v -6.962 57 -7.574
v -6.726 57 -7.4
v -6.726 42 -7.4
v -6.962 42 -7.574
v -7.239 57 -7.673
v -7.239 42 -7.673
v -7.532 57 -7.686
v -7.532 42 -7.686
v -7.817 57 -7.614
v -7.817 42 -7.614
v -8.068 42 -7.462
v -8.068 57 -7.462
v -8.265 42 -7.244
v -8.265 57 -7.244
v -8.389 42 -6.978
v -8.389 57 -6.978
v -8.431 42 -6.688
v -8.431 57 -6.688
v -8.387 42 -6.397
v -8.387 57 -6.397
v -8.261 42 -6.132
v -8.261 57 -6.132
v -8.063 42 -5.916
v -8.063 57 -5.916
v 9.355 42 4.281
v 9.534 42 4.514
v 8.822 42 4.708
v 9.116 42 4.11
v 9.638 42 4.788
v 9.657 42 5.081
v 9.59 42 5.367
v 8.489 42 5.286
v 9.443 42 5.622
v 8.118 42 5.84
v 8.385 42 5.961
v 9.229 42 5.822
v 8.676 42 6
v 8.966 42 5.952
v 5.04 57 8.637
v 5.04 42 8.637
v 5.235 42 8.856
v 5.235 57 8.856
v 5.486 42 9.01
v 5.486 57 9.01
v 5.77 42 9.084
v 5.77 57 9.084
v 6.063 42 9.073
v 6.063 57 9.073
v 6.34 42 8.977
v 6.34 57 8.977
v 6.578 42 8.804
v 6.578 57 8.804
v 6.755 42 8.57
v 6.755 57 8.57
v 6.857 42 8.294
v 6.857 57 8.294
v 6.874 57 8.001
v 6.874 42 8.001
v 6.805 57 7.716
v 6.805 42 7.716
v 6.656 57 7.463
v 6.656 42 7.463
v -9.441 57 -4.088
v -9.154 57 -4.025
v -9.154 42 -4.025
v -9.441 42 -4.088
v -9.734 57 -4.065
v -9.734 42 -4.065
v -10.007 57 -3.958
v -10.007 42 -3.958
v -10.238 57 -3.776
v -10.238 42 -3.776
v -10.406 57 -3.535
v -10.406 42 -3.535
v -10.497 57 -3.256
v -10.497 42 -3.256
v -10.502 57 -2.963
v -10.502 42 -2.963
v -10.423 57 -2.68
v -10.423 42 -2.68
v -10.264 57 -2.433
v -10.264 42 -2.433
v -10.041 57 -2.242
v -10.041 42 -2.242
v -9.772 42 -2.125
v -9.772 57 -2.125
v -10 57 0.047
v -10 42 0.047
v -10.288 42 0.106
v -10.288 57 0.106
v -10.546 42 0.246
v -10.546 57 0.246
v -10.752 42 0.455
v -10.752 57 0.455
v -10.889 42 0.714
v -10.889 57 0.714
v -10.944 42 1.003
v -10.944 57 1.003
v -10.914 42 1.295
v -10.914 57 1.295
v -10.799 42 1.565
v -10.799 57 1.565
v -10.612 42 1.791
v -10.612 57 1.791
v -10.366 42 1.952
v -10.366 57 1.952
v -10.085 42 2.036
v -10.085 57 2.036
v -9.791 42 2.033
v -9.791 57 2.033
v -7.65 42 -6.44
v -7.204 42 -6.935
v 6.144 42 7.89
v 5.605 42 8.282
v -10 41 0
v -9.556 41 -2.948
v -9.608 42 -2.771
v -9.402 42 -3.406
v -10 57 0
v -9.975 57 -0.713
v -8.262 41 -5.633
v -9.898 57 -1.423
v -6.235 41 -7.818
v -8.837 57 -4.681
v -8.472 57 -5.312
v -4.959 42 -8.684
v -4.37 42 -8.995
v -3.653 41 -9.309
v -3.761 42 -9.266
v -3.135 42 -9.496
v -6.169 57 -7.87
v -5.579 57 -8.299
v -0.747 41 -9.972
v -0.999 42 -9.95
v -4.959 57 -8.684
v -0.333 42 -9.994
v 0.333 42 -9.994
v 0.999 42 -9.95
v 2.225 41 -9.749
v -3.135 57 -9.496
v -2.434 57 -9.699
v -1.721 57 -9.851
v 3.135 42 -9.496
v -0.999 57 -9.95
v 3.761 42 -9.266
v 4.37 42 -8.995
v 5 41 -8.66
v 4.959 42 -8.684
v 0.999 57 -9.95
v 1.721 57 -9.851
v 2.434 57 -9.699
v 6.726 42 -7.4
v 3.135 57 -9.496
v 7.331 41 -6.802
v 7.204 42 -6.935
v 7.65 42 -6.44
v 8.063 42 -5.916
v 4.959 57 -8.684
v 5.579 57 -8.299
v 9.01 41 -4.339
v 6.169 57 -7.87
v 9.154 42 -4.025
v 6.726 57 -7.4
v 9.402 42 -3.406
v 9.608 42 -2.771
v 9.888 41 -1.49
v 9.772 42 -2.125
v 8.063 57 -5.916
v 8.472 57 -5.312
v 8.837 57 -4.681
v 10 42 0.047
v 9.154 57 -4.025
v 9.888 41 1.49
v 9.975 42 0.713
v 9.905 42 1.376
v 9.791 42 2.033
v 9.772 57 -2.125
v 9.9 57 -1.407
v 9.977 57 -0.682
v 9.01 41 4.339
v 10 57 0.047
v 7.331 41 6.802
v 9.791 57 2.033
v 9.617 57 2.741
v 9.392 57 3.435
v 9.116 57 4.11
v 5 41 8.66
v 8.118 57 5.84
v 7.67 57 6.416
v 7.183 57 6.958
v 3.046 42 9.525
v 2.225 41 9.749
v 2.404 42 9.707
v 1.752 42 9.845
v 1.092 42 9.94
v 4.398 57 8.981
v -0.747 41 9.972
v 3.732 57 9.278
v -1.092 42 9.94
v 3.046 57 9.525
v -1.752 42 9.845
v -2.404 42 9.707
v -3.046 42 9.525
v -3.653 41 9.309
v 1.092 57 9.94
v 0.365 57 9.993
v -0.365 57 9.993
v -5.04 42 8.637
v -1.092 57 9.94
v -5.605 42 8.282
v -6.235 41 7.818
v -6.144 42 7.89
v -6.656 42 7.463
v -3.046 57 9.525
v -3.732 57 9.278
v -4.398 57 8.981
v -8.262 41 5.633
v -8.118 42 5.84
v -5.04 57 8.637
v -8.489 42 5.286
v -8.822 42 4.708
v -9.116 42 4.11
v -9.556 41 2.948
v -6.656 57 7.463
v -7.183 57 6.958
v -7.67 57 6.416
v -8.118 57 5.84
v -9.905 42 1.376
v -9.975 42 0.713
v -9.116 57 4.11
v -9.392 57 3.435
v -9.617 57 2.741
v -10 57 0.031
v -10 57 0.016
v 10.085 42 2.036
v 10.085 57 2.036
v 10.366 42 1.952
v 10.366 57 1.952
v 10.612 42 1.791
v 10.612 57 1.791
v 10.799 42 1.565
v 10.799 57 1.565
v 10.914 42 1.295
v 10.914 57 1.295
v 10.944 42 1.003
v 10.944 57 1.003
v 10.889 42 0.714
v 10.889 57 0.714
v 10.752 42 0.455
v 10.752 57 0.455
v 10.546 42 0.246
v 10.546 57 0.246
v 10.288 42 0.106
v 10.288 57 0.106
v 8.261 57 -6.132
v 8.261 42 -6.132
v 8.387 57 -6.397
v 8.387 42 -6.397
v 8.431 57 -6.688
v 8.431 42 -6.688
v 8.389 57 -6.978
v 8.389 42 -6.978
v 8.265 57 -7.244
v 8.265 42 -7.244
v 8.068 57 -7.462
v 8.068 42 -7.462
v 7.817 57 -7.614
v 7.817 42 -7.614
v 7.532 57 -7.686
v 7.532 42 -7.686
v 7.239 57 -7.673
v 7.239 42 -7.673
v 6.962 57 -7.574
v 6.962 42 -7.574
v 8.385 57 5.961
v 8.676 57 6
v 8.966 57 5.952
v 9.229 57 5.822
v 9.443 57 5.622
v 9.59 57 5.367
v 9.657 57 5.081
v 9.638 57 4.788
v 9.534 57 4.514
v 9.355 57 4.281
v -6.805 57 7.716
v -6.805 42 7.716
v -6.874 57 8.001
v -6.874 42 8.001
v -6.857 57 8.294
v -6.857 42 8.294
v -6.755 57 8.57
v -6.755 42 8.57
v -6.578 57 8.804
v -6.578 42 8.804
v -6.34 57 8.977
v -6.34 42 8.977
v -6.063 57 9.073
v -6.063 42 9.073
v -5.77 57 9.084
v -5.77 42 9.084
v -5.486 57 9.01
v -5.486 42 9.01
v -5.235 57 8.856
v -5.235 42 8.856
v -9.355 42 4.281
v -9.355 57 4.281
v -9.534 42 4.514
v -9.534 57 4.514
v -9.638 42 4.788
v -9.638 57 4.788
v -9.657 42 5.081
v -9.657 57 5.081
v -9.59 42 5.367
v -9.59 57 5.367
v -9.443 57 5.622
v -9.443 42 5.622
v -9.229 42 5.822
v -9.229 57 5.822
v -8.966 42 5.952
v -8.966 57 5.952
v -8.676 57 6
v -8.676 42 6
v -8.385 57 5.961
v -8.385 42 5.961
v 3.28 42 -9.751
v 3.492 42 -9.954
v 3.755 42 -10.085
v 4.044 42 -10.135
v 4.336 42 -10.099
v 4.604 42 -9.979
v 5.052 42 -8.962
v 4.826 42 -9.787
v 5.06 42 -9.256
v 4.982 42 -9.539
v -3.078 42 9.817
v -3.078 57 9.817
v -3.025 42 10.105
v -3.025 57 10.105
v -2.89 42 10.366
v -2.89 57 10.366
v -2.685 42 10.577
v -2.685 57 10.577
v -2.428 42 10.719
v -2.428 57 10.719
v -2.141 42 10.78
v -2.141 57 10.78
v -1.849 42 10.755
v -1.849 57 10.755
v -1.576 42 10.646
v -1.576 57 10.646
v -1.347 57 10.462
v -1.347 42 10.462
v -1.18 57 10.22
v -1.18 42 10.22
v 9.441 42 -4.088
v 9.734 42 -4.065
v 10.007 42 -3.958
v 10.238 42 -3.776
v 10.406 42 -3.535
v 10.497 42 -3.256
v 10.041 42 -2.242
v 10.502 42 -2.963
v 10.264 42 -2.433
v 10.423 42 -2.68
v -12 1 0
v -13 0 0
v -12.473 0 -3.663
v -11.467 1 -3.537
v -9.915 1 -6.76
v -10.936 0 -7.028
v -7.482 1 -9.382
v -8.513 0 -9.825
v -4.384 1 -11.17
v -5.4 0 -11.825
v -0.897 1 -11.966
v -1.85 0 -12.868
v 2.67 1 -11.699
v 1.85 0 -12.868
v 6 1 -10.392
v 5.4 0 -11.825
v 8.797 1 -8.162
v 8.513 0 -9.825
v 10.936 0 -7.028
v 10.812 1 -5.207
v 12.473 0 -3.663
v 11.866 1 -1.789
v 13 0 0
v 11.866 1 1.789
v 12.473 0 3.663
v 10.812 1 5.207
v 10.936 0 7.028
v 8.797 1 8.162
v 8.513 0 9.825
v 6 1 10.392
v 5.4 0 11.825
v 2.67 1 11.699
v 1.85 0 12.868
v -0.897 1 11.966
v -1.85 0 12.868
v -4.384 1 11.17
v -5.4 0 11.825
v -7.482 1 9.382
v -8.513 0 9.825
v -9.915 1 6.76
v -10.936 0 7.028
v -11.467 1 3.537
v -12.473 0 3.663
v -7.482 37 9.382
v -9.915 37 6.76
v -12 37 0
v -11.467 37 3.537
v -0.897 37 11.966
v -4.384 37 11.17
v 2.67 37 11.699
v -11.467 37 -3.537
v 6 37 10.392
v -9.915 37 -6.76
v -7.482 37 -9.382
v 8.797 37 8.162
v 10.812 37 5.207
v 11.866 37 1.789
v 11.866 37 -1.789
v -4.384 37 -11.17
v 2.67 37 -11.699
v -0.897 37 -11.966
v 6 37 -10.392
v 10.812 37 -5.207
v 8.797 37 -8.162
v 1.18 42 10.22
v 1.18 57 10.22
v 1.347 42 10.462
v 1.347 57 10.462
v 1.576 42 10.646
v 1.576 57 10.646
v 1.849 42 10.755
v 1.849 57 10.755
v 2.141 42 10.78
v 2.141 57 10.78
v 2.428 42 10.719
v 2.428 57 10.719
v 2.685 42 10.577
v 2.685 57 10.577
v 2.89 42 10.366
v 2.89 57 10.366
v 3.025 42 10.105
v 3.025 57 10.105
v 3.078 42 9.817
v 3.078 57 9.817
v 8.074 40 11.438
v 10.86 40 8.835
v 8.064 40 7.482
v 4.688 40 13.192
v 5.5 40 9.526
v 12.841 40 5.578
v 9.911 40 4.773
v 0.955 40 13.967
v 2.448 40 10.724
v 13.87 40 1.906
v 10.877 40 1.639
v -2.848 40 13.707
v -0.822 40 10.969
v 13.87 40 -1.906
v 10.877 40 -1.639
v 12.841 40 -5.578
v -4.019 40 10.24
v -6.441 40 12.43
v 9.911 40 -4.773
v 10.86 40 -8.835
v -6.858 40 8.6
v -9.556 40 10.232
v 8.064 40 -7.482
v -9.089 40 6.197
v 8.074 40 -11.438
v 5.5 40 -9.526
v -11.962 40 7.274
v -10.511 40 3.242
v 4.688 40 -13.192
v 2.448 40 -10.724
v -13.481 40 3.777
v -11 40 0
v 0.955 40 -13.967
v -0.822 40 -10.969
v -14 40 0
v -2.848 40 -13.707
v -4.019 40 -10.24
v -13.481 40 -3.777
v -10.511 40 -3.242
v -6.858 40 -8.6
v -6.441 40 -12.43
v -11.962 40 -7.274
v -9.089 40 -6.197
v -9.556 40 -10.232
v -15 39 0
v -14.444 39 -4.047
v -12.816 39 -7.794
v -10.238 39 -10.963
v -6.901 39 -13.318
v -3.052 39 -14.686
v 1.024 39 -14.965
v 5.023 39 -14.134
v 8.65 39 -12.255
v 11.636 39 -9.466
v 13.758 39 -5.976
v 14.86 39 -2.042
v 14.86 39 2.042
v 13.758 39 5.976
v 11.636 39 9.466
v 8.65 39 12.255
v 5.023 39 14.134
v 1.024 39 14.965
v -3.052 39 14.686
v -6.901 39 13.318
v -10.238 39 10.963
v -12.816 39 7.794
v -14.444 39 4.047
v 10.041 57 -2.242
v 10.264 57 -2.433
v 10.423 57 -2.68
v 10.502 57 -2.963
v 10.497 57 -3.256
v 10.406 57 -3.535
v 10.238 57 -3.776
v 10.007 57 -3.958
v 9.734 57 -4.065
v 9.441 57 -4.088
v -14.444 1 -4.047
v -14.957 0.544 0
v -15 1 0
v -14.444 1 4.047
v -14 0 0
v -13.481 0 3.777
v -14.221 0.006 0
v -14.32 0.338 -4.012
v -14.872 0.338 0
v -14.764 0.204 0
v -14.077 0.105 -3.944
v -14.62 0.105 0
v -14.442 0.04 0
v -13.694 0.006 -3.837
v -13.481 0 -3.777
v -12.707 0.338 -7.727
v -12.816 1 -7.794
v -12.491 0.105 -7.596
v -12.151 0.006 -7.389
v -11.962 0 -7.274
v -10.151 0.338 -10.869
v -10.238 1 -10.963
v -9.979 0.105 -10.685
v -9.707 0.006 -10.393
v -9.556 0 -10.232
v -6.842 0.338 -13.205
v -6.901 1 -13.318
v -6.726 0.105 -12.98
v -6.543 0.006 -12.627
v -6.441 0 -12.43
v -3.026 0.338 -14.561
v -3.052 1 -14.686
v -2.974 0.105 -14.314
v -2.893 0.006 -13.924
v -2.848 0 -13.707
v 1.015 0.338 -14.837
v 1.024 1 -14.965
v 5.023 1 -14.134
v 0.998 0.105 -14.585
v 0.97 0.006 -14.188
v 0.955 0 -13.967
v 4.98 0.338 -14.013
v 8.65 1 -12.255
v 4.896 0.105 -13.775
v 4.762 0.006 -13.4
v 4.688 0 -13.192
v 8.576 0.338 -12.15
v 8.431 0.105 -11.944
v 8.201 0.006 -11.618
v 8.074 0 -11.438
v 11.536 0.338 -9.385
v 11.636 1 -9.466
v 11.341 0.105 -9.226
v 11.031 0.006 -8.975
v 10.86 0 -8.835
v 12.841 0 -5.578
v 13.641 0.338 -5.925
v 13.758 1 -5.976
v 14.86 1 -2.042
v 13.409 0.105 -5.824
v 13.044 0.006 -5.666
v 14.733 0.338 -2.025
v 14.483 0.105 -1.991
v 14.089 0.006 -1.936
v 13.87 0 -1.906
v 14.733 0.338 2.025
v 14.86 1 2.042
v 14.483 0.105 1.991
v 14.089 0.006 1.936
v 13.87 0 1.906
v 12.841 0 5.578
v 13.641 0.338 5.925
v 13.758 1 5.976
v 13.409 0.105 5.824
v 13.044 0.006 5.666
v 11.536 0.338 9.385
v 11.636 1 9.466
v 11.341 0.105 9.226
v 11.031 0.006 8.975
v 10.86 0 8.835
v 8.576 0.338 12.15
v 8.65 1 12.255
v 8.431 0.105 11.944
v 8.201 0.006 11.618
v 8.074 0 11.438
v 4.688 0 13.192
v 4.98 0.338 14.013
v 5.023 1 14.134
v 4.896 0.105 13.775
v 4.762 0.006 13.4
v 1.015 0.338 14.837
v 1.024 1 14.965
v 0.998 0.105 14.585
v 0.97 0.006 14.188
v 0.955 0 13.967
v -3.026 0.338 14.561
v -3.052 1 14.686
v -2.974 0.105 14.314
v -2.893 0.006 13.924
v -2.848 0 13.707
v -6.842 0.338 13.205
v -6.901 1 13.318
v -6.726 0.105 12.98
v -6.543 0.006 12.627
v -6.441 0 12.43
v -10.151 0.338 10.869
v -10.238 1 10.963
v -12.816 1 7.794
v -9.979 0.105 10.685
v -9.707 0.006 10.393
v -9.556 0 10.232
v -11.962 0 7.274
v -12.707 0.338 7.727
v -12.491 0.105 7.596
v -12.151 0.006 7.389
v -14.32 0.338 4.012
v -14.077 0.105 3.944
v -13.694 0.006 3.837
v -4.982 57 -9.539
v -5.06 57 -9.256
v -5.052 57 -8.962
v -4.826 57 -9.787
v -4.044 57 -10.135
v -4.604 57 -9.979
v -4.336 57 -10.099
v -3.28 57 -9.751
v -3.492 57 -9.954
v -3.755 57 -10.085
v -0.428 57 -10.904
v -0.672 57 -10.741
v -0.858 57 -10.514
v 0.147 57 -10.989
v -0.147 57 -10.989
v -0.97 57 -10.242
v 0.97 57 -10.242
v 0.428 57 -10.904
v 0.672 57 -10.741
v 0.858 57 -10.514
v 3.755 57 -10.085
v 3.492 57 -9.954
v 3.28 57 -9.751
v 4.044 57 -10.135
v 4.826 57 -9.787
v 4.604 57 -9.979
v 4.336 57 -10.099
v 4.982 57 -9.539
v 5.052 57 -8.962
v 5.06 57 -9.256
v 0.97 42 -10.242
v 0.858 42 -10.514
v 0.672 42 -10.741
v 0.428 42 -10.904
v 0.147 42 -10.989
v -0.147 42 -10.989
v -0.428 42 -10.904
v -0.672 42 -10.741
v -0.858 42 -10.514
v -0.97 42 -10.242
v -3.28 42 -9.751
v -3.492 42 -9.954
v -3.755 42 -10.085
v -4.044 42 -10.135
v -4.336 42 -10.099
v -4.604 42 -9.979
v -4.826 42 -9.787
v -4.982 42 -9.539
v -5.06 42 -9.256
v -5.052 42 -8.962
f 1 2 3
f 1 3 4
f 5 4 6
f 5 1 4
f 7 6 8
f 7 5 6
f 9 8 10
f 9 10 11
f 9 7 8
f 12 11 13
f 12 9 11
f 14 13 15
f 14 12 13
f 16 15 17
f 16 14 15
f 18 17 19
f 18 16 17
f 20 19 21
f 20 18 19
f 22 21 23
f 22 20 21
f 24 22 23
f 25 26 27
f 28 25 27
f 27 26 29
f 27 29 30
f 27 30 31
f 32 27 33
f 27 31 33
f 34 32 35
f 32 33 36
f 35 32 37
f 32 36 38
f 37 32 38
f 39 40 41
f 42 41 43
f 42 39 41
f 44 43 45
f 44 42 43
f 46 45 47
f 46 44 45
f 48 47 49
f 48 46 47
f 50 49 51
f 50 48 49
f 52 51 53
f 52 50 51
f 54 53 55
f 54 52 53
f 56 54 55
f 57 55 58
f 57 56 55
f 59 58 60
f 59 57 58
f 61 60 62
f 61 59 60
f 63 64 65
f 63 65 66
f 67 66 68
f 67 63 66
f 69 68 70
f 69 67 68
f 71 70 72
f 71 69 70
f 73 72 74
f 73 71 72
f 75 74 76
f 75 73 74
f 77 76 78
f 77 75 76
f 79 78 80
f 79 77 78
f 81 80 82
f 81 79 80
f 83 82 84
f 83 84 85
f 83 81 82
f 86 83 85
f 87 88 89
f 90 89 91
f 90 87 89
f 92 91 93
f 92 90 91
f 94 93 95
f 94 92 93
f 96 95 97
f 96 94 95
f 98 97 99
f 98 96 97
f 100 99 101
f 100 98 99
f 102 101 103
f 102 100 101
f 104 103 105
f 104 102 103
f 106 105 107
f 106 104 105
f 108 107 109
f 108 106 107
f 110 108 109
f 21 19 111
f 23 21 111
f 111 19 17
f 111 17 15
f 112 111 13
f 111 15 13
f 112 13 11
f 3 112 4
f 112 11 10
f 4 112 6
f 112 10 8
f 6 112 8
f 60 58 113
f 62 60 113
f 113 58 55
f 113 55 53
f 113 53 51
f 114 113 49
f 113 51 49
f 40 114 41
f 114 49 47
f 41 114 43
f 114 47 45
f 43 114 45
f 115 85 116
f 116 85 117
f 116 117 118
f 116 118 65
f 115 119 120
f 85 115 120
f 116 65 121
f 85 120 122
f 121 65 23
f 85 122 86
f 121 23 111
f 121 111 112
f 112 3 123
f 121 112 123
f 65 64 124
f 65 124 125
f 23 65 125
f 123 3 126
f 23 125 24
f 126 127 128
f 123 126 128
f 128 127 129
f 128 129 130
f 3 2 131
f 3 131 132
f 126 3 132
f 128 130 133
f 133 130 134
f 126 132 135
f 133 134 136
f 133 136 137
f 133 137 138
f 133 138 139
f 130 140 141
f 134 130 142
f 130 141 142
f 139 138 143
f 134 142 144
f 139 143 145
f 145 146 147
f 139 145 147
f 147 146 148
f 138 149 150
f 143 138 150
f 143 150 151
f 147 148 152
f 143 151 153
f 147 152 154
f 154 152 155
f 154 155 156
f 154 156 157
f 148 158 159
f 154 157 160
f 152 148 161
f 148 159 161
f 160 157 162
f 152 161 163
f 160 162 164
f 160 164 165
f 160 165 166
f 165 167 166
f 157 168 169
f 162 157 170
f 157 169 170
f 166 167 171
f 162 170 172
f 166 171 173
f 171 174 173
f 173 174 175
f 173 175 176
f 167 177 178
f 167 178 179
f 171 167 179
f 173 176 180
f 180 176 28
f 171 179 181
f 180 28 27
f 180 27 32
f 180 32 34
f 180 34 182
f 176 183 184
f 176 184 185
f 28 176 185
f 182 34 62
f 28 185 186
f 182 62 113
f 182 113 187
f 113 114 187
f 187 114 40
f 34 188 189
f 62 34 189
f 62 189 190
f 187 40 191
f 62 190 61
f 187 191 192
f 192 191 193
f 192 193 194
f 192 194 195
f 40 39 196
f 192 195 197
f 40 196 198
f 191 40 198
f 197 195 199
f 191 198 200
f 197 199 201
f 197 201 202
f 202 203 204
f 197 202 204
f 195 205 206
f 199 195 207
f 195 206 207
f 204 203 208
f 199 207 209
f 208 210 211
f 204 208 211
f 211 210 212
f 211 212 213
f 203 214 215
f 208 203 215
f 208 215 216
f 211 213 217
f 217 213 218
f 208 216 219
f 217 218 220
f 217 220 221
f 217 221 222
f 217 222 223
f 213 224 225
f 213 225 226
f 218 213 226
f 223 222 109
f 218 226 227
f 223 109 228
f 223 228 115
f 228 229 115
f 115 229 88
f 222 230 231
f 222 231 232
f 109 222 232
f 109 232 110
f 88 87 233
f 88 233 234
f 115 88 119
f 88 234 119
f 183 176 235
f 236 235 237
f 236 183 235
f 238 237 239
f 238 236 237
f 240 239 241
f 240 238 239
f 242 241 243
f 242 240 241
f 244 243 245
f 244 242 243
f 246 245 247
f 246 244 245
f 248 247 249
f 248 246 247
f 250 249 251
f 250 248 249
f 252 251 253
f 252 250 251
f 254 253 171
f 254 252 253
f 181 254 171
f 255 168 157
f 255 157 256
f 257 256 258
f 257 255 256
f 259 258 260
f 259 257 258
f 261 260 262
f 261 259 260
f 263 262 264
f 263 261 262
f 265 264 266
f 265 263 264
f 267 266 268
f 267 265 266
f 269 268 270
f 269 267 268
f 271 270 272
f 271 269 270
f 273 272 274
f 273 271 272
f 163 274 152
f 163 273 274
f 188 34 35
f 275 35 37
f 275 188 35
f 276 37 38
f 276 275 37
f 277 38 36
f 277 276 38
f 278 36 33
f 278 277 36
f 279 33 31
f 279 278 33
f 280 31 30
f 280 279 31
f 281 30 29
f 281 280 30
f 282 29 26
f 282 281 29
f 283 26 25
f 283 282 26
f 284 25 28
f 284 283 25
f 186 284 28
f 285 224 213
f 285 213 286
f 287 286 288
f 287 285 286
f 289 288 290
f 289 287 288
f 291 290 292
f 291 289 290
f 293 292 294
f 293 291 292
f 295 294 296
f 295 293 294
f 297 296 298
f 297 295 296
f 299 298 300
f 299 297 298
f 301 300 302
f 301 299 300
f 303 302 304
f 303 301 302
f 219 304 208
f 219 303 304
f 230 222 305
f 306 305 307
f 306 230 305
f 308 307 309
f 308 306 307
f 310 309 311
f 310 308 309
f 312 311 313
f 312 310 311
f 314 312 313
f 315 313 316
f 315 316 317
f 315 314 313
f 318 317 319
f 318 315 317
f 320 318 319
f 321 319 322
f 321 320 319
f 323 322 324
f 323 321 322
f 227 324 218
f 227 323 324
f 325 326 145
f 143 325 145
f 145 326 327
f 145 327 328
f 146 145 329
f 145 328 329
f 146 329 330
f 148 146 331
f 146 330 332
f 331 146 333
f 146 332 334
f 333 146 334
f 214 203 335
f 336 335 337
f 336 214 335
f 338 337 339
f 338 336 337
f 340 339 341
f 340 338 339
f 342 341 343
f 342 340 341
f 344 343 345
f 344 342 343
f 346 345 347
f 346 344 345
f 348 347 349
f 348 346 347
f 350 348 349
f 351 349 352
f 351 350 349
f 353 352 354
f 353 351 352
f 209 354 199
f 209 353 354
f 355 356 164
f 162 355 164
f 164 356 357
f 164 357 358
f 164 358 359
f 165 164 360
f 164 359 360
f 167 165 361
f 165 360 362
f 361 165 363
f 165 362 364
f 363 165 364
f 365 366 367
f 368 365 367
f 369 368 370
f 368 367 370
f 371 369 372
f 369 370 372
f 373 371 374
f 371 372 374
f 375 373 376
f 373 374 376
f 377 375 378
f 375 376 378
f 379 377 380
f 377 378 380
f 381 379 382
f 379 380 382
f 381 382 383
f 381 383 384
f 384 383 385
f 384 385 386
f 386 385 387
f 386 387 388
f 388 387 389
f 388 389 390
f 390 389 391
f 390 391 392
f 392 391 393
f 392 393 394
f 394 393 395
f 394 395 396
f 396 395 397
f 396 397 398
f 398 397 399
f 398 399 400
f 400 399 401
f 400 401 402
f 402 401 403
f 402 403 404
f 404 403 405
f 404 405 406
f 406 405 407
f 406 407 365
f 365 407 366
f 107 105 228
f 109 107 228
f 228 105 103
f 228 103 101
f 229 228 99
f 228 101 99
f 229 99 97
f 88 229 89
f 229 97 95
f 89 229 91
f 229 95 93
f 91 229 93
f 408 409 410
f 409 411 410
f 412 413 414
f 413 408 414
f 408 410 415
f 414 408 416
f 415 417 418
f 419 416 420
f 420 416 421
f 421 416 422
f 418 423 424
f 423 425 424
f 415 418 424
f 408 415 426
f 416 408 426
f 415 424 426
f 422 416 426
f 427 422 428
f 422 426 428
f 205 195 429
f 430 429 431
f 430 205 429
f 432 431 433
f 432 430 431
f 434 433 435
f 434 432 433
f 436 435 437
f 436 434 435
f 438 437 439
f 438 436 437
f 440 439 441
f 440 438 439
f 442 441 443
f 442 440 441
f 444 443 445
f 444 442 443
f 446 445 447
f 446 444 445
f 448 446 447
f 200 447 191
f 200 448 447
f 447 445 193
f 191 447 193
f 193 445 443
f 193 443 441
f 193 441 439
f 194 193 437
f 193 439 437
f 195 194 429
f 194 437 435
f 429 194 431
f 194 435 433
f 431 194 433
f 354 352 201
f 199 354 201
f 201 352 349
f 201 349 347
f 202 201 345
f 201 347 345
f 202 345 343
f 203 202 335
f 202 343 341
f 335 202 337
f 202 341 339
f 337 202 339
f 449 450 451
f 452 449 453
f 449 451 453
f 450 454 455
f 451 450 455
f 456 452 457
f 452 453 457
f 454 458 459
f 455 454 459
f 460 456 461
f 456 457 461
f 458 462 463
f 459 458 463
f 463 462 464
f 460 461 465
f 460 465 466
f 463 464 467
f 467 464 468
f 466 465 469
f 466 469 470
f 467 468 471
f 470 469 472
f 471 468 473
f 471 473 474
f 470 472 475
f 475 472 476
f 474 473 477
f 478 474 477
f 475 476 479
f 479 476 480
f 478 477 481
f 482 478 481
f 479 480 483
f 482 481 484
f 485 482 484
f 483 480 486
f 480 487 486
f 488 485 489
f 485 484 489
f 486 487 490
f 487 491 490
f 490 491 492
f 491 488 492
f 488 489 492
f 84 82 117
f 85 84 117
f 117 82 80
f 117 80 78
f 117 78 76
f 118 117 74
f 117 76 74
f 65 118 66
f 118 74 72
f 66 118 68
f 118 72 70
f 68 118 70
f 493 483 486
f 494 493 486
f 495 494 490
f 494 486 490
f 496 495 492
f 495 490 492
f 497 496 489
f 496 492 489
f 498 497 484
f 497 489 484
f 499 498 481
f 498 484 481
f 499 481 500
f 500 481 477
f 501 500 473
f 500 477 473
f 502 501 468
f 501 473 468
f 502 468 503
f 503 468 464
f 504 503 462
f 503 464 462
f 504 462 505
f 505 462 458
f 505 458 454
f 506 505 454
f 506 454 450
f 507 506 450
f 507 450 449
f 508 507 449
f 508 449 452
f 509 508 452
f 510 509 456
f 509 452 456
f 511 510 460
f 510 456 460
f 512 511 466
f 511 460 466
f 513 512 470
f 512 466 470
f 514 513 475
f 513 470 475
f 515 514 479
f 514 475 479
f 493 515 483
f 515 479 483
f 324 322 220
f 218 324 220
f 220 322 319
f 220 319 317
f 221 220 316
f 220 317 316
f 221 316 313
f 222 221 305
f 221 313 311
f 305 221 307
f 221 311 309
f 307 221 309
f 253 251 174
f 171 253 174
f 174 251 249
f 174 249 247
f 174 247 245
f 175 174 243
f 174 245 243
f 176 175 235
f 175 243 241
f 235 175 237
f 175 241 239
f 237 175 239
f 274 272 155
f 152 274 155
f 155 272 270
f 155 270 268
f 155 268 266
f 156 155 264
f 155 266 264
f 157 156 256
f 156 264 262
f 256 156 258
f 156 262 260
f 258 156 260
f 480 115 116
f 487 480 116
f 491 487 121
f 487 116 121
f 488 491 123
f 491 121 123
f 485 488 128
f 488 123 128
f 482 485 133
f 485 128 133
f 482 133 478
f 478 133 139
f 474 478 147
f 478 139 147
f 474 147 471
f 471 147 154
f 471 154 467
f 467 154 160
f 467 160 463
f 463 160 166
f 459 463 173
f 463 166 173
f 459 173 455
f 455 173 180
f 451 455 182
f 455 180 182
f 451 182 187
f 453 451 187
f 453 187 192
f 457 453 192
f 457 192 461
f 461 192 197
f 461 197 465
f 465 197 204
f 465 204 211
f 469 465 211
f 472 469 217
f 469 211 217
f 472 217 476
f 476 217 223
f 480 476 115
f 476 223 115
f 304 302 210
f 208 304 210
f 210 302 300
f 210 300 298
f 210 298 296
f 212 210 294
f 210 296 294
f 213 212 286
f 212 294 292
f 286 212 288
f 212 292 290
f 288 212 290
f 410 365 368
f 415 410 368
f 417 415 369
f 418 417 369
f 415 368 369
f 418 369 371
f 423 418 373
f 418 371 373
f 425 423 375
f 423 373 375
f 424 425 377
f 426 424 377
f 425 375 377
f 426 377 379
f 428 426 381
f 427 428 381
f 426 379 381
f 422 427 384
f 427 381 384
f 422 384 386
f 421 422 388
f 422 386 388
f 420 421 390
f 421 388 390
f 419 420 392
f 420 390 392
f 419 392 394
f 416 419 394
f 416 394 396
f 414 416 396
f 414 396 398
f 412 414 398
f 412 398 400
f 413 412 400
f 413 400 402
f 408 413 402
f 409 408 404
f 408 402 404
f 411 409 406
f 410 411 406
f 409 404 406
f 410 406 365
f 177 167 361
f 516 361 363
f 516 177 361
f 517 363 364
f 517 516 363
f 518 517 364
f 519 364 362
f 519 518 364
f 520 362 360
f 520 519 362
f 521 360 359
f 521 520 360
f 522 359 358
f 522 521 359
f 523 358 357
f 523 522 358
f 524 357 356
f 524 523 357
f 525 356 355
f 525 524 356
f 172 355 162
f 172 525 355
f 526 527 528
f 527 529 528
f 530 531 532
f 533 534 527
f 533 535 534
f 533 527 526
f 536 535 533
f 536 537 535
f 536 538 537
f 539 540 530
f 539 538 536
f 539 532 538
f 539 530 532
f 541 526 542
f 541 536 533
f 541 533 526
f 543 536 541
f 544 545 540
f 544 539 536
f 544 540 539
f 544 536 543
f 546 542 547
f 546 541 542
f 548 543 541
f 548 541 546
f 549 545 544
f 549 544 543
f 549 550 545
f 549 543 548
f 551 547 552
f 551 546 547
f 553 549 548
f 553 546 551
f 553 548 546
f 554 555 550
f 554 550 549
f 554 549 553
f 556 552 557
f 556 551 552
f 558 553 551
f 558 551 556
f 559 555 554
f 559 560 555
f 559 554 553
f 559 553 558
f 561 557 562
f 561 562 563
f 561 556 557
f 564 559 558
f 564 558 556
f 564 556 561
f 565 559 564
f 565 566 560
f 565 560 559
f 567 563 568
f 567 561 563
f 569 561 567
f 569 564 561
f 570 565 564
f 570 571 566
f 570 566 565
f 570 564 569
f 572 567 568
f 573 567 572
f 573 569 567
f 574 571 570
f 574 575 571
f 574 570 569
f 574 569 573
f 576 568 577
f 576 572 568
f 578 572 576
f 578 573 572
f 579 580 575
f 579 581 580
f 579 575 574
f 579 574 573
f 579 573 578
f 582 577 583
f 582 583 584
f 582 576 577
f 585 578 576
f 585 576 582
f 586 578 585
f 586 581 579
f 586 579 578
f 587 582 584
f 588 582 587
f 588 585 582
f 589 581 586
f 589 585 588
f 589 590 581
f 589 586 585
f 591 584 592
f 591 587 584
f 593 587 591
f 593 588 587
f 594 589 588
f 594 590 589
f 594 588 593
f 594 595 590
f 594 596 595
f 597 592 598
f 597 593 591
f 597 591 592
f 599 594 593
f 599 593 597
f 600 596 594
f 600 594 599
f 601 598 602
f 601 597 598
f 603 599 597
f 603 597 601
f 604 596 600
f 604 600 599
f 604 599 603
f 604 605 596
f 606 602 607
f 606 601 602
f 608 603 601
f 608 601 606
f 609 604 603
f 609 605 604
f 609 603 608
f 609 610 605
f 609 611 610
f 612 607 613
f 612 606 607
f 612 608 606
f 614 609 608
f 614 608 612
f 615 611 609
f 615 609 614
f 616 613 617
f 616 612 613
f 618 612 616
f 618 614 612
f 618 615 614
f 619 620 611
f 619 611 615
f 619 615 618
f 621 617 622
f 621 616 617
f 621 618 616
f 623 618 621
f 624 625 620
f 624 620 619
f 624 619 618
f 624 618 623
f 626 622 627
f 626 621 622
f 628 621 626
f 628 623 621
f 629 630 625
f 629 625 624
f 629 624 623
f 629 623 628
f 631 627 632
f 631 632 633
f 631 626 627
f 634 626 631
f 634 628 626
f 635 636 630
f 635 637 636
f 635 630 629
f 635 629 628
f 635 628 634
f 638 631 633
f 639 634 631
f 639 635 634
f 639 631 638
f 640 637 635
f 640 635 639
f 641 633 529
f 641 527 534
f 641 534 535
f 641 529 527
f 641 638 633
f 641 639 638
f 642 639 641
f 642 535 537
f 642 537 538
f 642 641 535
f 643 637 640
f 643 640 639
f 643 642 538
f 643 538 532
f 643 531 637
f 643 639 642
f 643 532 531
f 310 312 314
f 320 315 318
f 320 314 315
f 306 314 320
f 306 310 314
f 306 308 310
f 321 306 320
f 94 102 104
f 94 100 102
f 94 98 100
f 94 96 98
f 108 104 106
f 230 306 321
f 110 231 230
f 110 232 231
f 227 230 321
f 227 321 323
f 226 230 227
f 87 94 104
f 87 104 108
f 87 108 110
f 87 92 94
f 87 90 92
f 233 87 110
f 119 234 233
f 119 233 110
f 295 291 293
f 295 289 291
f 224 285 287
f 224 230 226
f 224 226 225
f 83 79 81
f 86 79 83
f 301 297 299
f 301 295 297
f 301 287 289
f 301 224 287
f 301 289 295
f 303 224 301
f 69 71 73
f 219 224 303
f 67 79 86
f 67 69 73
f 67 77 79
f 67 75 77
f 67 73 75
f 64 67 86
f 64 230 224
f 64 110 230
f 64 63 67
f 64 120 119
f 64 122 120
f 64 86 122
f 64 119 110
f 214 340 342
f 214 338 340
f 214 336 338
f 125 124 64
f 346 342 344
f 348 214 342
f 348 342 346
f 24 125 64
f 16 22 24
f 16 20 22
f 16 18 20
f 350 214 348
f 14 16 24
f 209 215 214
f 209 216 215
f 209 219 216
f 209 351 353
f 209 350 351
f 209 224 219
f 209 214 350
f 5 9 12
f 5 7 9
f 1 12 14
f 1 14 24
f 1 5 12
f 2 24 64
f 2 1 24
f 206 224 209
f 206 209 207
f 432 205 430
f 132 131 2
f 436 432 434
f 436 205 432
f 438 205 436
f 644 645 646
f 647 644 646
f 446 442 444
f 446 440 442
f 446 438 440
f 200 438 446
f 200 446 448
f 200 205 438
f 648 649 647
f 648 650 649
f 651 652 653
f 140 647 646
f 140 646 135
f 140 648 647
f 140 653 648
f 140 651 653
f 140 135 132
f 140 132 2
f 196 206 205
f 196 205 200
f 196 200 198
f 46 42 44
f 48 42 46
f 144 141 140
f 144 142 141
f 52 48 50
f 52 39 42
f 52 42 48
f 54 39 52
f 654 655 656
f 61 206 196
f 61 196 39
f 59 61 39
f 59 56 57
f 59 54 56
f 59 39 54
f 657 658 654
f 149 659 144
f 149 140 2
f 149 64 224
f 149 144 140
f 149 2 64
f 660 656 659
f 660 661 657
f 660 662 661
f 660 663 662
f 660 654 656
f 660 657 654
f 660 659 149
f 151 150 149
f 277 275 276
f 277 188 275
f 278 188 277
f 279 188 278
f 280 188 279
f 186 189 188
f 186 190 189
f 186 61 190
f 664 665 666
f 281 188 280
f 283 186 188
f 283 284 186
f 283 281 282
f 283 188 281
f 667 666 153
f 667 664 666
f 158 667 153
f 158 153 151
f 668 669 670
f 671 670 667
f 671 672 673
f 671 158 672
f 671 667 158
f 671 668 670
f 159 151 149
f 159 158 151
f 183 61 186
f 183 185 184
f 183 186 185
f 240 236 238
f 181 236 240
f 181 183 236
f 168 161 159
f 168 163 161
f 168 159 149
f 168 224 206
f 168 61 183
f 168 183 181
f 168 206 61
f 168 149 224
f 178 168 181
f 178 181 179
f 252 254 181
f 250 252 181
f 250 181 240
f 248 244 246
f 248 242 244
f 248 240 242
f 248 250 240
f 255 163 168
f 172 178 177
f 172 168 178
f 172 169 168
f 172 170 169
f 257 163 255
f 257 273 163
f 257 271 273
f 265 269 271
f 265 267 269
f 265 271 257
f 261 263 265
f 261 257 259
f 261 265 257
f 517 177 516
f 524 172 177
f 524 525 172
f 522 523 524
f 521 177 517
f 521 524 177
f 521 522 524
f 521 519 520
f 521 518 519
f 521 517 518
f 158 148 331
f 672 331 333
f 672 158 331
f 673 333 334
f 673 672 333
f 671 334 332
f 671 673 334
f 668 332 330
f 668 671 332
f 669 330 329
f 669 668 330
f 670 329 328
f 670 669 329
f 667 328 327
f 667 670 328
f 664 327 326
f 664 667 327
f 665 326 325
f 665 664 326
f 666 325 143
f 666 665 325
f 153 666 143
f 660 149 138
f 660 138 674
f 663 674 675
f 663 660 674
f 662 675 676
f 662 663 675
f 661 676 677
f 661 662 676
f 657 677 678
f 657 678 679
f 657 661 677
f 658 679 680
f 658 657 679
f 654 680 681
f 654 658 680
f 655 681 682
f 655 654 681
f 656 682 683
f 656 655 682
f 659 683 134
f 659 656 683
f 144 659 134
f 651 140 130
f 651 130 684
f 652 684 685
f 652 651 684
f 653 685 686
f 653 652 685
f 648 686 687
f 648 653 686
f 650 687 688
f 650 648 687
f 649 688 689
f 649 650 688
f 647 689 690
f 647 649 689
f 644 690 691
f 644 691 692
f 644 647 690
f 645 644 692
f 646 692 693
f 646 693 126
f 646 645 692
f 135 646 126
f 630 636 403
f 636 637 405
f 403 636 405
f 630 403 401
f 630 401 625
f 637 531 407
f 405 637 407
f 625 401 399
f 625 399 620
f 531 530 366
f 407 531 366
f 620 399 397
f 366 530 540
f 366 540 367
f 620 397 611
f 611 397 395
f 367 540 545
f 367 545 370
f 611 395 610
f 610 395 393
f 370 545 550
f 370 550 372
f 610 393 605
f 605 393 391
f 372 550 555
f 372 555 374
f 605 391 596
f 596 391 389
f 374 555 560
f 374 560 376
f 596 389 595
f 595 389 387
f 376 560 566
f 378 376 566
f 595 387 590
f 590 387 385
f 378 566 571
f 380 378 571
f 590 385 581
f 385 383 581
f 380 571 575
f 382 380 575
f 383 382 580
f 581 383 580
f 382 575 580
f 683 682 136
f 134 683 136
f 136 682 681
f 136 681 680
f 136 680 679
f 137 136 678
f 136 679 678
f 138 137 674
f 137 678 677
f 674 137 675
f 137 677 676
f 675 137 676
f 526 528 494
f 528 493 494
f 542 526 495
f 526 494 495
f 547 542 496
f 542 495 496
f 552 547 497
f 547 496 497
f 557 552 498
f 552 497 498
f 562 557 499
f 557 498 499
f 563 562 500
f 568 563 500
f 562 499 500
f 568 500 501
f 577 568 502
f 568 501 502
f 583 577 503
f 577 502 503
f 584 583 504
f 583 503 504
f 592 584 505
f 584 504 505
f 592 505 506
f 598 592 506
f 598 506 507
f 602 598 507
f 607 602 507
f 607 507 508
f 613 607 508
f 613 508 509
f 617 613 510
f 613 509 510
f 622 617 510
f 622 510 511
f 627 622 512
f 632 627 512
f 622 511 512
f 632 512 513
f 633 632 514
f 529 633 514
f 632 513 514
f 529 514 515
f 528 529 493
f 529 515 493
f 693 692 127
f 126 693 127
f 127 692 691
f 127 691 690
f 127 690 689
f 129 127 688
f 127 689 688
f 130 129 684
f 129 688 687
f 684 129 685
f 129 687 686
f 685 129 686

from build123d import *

# Parameters (mm, degrees)
CHAMFER1_SIZE       = 1
FILLET1_SIZE        = 1
SKETCH2_R           = 1
BOSS_EXTRUDE1_DEPTH = 15
CIRPATTERN1_COUNT   = 15


with BuildPart() as part:
    # Sketch1 → Revolve1 (revolve)
    with BuildSketch(Plane.XY, mode=Mode.PRIVATE) as revolve1_sk:
        Polygon((15, 0), (15, 40), (10, 40), (10, 57), (0, 57), (0, 37), (12, 37), (12, 0), align=None)
    revolve(revolve1_sk.sketch.rotate(Axis((0, 57, 0), (0, -1, 0)), 180), axis=Axis((0, 57, 0), (0, -1, 0)))

    # Chamfer1
    chamfer1_edges = [part.edges().sort_by_distance(p)[0] for p in [
        (12, 0, 0),
        (10, 40, 0),
        (15, 40, 0),
    ]]
    chamfer(chamfer1_edges, length=CHAMFER1_SIZE)

    # Fillet1
    # a fillet whose section is not a circle: 1 mm, written as the material it takes off along each edge
    with BuildSketch(Plane(origin=(0, 0, 0), x_dir=(-1, 0, 0), z_dir=(0, 0, 1))) as fillet1_piece_1:
        with BuildLine():
            add(Edge.make_bspline([(15, -FILLET1_SIZE), (15, -FILLET1_SIZE * 0.831801948466), (15, -FILLET1_SIZE * 0.663603896932), (15 - FILLET1_SIZE * 0.0716919198361, -FILLET1_SIZE * 0.292893218813), (15 - FILLET1_SIZE * 0.292893218813, -FILLET1_SIZE * 0.0716919198361), (15 - FILLET1_SIZE * 0.663603896932, 0), (15 - FILLET1_SIZE * 0.831801948466, 0), (15 - FILLET1_SIZE, 0)], knots=[0, 0, 0, 0, 0, 0, 0.5, 0.5, 1, 1, 1, 1, 1, 1], degree=5))
            Line((15 - FILLET1_SIZE, 0), (15, 0))
            Line((15, 0), (15, -FILLET1_SIZE))
        make_face()
    revolve(axis=Axis((0, 0, 0), (0, -1, 0)), mode=Mode.SUBTRACT)

    # Sketch2 → Boss-Extrude1 (add)
    with BuildSketch(Plane(origin=(0, 57, 0), x_dir=(1, 0, 0), z_dir=(0, 1, 0))):
        with Locations((0, 10)):
            Circle(SKETCH2_R)
    boss_extrude1 = extrude(amount=-BOSS_EXTRUDE1_DEPTH)

    # CirPattern1: Boss-Extrude1 ×15 about axis
    cirpattern1_axis = Axis((0, 0, 0), (0, 1, 0))
    for i in range(1, CIRPATTERN1_COUNT):
        add(boss_extrude1.rotate(cirpattern1_axis, i * 360 / CIRPATTERN1_COUNT))


solid = part.part
